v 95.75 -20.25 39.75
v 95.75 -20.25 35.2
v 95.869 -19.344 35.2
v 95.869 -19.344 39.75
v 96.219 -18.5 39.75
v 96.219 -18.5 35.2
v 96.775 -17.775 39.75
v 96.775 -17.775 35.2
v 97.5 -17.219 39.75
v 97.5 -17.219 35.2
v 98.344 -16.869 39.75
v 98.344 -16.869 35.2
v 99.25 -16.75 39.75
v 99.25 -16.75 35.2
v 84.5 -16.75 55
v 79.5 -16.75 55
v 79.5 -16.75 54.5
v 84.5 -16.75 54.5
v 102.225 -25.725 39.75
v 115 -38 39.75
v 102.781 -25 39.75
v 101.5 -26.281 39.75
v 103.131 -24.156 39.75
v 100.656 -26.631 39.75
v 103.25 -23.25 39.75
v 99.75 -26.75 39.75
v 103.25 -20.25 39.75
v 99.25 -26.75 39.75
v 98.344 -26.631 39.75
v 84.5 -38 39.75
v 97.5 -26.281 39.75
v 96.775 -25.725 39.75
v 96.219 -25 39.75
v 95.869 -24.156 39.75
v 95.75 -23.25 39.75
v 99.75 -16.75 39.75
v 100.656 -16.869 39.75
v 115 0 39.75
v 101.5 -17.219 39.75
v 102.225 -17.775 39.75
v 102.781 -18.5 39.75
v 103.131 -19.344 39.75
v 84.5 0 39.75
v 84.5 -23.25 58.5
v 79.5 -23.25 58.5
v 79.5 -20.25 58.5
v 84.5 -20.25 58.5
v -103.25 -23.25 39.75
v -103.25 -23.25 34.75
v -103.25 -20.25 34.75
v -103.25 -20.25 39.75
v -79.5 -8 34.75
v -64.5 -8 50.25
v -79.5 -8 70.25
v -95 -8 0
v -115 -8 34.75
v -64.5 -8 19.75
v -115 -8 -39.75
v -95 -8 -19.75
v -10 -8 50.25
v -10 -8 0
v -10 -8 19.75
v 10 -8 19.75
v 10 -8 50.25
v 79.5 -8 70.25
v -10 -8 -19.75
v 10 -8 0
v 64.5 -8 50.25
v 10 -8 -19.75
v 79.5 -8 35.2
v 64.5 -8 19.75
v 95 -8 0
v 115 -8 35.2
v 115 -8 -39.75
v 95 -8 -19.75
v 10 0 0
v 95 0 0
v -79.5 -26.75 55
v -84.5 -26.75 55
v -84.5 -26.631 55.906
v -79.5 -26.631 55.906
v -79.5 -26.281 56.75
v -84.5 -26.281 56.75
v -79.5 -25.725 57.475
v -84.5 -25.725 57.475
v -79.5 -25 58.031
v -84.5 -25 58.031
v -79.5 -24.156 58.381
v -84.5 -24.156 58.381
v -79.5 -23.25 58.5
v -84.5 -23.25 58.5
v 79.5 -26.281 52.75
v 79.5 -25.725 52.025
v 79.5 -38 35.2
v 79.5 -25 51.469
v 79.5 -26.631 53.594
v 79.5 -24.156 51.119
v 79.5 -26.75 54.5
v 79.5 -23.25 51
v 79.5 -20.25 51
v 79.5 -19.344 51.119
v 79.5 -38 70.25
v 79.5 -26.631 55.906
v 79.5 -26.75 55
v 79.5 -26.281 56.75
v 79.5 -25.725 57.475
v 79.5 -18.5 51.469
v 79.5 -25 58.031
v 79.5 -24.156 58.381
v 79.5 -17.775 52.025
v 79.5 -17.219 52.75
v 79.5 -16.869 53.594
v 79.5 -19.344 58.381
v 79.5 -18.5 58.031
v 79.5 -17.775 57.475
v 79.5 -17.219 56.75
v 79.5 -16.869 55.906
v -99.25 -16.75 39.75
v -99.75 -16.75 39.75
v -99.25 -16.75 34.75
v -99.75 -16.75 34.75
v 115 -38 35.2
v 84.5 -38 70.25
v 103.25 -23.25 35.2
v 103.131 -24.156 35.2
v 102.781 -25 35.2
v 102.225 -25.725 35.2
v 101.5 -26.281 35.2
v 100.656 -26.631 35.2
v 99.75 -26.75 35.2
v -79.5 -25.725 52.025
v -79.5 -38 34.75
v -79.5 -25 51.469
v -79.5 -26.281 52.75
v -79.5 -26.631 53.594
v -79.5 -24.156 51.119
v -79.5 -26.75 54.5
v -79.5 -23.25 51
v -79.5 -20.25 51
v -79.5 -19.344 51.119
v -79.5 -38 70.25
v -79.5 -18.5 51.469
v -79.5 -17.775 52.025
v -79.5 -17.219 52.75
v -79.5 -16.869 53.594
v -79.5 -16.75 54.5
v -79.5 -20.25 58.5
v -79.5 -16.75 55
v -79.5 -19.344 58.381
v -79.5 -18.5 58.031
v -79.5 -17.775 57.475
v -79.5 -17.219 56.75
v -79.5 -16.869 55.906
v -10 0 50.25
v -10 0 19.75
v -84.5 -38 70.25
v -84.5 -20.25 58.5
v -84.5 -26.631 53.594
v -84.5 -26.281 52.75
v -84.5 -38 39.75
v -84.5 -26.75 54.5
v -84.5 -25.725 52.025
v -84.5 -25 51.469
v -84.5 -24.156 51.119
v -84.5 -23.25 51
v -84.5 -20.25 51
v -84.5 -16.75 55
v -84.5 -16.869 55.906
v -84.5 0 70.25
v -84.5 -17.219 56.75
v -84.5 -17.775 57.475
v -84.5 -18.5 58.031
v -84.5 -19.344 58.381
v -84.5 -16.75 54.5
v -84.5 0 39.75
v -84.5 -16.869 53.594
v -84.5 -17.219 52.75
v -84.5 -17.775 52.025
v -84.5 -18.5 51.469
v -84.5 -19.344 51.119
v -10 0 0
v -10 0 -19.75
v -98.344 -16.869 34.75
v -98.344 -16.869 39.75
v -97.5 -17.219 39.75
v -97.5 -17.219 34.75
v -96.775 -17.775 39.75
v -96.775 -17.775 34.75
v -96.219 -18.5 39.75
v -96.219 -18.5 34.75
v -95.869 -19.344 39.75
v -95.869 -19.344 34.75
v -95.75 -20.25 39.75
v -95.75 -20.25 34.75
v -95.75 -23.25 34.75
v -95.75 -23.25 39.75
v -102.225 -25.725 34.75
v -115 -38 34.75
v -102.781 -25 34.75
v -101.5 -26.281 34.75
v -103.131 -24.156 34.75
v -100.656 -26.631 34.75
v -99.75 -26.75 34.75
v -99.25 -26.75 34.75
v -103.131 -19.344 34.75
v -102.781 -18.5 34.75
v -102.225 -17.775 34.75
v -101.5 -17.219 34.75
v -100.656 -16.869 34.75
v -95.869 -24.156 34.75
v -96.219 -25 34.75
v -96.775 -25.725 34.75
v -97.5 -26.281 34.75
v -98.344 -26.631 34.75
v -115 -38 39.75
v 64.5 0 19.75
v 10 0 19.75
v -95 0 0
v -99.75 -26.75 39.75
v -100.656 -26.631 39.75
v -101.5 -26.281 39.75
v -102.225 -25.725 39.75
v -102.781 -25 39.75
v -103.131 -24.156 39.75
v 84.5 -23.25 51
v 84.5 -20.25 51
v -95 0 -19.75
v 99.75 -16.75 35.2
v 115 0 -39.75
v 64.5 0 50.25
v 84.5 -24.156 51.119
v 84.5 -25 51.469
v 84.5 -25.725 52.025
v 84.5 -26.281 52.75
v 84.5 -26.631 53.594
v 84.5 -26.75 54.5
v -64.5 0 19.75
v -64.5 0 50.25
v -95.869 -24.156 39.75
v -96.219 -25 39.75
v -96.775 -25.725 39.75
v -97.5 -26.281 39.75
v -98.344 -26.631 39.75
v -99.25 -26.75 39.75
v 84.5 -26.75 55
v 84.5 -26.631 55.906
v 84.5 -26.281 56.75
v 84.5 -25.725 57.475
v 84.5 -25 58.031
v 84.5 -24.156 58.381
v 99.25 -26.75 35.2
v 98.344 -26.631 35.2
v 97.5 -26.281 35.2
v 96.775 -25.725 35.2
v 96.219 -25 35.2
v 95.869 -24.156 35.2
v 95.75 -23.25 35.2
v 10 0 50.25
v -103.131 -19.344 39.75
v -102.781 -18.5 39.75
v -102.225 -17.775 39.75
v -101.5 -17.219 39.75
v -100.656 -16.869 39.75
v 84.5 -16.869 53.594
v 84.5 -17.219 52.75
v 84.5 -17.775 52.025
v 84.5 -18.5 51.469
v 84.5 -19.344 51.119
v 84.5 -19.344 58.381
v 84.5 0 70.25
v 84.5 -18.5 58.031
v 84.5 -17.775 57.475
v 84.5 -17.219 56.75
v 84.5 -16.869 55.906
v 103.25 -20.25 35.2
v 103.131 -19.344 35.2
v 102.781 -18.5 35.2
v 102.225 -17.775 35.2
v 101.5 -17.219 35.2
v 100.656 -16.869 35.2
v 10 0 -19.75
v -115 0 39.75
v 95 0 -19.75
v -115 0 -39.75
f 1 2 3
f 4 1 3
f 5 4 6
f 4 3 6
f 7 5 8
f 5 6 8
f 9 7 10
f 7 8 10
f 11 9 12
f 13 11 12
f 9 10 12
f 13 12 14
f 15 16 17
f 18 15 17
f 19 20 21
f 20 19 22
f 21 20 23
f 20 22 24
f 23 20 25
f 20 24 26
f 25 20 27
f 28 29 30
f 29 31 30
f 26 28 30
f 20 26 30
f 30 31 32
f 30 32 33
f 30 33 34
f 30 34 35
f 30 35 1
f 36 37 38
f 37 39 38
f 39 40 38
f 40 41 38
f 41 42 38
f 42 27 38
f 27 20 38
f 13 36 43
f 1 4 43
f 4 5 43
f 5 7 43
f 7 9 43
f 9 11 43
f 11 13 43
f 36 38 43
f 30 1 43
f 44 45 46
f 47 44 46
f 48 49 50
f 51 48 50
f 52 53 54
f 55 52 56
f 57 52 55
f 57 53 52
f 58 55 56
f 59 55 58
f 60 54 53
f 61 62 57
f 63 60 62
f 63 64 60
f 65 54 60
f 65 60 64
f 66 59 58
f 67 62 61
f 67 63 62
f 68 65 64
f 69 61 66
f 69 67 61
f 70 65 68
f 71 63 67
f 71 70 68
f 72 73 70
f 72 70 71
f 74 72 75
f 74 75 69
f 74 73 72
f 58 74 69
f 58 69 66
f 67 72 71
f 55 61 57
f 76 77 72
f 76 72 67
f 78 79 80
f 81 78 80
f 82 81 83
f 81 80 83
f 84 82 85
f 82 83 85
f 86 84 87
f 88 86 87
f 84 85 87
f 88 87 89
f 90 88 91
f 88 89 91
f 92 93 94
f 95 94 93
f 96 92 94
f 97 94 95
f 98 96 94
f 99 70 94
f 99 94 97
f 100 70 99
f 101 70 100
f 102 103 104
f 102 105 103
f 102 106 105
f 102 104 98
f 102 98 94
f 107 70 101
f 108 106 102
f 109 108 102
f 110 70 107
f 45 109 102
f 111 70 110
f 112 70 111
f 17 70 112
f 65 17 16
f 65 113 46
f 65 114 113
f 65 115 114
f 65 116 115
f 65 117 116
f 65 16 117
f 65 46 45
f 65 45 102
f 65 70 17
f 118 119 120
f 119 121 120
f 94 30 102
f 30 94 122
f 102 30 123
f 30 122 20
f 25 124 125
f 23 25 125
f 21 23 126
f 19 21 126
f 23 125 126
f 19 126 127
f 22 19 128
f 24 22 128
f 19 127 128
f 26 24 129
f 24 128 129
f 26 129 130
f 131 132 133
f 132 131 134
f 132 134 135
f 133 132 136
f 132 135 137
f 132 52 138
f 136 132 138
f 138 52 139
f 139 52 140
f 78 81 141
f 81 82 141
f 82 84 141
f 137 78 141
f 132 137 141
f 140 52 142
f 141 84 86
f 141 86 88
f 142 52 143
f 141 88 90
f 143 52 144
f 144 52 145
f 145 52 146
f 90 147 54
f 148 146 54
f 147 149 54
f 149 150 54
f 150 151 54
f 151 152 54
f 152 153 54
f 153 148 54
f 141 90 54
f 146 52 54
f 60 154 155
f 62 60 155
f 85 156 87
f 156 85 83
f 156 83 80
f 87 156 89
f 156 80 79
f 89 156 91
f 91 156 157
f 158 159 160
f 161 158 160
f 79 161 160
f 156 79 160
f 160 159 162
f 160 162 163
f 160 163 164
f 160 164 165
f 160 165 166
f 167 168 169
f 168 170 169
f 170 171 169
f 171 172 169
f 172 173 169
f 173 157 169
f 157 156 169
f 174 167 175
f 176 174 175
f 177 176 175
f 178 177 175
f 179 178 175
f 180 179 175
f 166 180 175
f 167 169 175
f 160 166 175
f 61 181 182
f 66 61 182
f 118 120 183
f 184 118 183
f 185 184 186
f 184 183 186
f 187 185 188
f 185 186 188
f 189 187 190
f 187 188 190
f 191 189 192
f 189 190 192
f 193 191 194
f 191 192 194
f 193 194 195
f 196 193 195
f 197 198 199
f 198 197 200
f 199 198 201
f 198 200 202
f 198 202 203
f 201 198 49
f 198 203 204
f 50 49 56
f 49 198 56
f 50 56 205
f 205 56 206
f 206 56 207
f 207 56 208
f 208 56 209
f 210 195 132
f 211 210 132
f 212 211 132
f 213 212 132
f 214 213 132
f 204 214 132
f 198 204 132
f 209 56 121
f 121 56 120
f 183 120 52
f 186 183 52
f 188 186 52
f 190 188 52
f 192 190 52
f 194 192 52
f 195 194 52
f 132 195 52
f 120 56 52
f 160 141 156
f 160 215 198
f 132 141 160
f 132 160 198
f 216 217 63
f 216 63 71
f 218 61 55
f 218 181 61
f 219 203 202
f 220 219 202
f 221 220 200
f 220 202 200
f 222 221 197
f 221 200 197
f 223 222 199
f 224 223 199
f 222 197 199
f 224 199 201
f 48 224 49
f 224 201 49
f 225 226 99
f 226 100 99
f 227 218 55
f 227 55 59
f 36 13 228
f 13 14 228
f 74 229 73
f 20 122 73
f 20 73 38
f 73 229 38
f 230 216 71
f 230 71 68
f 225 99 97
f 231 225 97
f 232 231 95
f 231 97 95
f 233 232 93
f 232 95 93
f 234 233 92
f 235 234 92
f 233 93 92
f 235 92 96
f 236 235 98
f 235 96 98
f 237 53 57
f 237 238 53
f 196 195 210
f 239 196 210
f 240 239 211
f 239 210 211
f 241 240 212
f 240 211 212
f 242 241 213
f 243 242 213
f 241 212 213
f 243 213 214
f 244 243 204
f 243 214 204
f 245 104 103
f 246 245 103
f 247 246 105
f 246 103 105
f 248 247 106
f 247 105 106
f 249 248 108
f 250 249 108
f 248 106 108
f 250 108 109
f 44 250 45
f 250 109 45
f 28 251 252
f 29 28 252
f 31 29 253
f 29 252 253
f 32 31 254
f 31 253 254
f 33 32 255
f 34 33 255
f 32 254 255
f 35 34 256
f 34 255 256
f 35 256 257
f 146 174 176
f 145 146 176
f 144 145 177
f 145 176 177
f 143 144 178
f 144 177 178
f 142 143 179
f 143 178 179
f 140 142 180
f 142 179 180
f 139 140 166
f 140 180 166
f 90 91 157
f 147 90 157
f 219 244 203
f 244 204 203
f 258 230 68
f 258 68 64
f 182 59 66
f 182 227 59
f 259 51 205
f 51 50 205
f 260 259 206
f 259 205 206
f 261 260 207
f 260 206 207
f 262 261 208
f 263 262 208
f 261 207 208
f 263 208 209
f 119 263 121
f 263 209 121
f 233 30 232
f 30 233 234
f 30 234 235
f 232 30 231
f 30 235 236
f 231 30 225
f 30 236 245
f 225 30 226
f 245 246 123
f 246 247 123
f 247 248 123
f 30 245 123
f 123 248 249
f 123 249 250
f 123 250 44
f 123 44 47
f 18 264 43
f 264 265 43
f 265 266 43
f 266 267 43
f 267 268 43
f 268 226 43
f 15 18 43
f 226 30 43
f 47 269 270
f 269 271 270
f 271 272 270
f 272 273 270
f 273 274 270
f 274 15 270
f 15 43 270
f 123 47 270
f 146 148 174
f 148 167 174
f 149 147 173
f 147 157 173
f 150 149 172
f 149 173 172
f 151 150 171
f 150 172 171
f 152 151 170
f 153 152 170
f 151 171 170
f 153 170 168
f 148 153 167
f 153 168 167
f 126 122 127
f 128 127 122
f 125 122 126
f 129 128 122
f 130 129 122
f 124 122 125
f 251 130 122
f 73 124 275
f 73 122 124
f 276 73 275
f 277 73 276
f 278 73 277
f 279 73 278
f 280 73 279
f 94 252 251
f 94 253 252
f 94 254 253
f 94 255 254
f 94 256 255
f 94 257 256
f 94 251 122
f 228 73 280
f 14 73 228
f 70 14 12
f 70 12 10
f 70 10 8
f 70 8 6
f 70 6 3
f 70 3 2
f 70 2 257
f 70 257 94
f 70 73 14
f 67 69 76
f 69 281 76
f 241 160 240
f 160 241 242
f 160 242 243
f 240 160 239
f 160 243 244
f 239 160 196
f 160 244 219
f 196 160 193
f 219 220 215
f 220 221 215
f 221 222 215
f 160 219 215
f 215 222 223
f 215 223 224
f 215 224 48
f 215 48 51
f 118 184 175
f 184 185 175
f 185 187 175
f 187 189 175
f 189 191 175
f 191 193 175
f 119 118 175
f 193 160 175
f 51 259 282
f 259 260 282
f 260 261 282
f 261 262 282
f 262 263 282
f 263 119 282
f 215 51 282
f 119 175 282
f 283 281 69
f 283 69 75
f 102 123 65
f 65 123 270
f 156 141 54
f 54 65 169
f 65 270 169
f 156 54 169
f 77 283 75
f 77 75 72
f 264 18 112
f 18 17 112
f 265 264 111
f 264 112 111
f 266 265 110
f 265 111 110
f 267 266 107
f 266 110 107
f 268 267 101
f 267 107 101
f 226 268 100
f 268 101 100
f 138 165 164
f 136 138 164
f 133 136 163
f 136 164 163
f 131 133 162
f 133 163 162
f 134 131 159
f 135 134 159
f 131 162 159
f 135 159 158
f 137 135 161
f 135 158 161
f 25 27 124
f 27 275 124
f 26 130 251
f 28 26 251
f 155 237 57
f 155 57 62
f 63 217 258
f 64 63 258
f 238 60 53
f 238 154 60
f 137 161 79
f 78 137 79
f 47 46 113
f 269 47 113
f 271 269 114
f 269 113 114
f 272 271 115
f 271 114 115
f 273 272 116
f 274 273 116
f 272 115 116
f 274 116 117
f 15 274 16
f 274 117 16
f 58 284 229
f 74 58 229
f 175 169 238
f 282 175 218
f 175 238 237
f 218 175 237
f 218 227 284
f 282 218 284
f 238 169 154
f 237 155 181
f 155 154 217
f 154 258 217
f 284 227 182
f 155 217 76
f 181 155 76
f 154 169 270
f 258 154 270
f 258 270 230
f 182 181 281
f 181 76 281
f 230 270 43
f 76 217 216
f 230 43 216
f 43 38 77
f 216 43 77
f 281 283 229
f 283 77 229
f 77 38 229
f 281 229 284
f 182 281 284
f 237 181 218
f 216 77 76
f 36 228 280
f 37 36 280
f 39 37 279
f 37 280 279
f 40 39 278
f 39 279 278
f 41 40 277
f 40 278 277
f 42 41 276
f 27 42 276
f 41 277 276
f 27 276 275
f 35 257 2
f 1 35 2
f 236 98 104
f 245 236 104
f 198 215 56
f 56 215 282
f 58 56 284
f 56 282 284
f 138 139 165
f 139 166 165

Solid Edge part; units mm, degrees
sketch "Sketch1" plane through (0, 0, 0) normal (0, -1, 0) x (1, 0, 0)
  line L0 (-10, 50.25) -> (-64.5, 50.25)
  line L1 (-64.5, 50.25) -> (-64.5, 19.75)
  line L2 (-64.5, 19.75) -> (-10, 19.75)
  line L3 (-10, 50.25) -> (-10, 19.75)
  line L4 (-10, 0) -> (-95, 0)
  line L5 (-95, 0) -> (-95, -19.75)
  line L6 (-95, -19.75) -> (-10, -19.75)
  line L7 (-10, 0) -> (-10, -19.75)
  line L8 (95, -19.75) -> (95, 0)
  line L9 (95, 0) -> (10, 0)
  line L10 (10, -19.75) -> (10, 0)
  line L11 (10, -19.75) -> (95, -19.75)
  line L12 (-84.5, 39.75) -> (-115, 39.75)
  line L13 (-115, 39.75) -> (-115, -39.75)
  line L14 (-115, -39.75) -> (115, -39.75)
  line L15 (115, -39.75) -> (115, 39.75)
  line L16 (115, 39.75) -> (84.5, 39.75)
  line L17 (84.5, 39.75) -> (84.5, 70.25)
  line L18 (84.5, 70.25) -> (-84.5, 70.25)
  line L19 (-84.5, 70.25) -> (-84.5, 39.75)
  line L20 (10, 19.75) -> (64.5, 19.75)
  line L21 (64.5, 19.75) -> (64.5, 50.25)
  line L22 (64.5, 50.25) -> (10, 50.25)
  line L23 (10, 19.75) -> (10, 50.25)
  dimension "D1" = 230
  dimension "D2" = 30.5
  dimension "D3" = 30.5
  dimension "D4" = 30.5
  dimension "D5" = 30.5
  dimension "D6" = 110
  dimension "D7" = 20
extrude "Protrusion1" add sketch "Sketch1" along normal blind 8
sketch "Sketch2" plane through (0, -8, 15.25) normal (0, -1, 0) x (1, 0, 0)
  line L0 (-115, 24.5) -> (-115, 19.5)
  line L1 (-115, 19.5) -> (-79.5, 19.5)
  line L2 (-79.5, 19.5) -> (-79.5, 55)
  line L3 (-84.5, 55) -> (-79.5, 55)
  line L4 (-84.5, 55) -> (-84.5, 24.5)
  line L5 (-84.5, 24.5) -> (-115, 24.5)
  line L6 (115, 19.9501) -> (79.5, 19.9501)
  line L7 (79.5, 19.9501) -> (79.5, 55)
  line L8 (84.5, 55) -> (79.5, 55)
  line L9 (84.5, 55) -> (84.5, 24.5)
  line L10 (84.5, 24.5) -> (115, 24.5)
  line L11 (115, 24.5) -> (115, 19.9501)
extrude "Protrusion2" add sketch "Sketch2" along normal blind 30
sketch "Sketch3" plane through (-97.25, -23, 34.75) normal (0, 0, -1) x (1, 0, 0)
  arc A0 (-2, -6.25) -> (1.5, -2.75) centre (-2, -2.75) ccw
  line L0 (1.5, -2.75) -> (1.5, 0.25)
  arc A1 (1.5, 0.25) -> (-2, 3.75) centre (-2, 0.25) ccw
  line L1 (-2, 3.75) -> (-2.5, 3.75)
  arc A2 (-2.5, 3.75) -> (-6, 0.25) centre (-2.5, 0.25) ccw
  line L2 (-6, 0.25) -> (-6, -2.75)
  arc A3 (-6, -2.75) -> (-2.5, -6.25) centre (-2.5, -2.75) ccw
  line L3 (-2.5, -6.25) -> (-2, -6.25)
extrude "Cutout1" cut sketch "Sketch3" against normal blind 20
sketch "Sketch4" plane through (97.25, -23, 35.2001) normal (0, 0, -1) x (1, 0, 0)
  arc A0 (2.5, -6.25) -> (6, -2.75) centre (2.5, -2.75) ccw
  line L0 (6, -2.75) -> (6, 0.25)
  arc A1 (6, 0.25) -> (2.5, 3.75) centre (2.5, 0.25) ccw
  line L1 (2.5, 3.75) -> (2, 3.75)
  arc A2 (2, 3.75) -> (-1.5, 0.25) centre (2, 0.25) ccw
  line L2 (-1.5, 0.25) -> (-1.5, -2.75)
  arc A3 (2, -6.25) -> (-1.5, -2.75) centre (2, -2.75) cw
  line L3 (2, -6.25) -> (2.5, -6.25)
extrude "Cutout2" cut sketch "Sketch4" against normal blind 40
sketch "Sketch5" plane through (-84.5, -19, 55) normal (-1, 0, 0) x (0, 0, -1)
  arc A0 (0.5, -2.25) -> (4, 1.25) centre (0.5, 1.25) ccw
  line L0 (4, 1.25) -> (4, 4.25)
  arc A1 (4, 4.25) -> (0.5, 7.75) centre (0.5, 4.25) ccw
  line L1 (0.5, 7.75) -> (0, 7.75)
  arc A2 (0, 7.75) -> (-3.5, 4.25) centre (0, 4.25) ccw
  line L2 (-3.5, 4.25) -> (-3.5, 1.25)
  arc A3 (0, -2.25) -> (-3.5, 1.25) centre (0, 1.25) cw
  line L3 (0, -2.25) -> (0.5, -2.25)
extrude "Cutout3" cut sketch "Sketch5" against normal blind 200
